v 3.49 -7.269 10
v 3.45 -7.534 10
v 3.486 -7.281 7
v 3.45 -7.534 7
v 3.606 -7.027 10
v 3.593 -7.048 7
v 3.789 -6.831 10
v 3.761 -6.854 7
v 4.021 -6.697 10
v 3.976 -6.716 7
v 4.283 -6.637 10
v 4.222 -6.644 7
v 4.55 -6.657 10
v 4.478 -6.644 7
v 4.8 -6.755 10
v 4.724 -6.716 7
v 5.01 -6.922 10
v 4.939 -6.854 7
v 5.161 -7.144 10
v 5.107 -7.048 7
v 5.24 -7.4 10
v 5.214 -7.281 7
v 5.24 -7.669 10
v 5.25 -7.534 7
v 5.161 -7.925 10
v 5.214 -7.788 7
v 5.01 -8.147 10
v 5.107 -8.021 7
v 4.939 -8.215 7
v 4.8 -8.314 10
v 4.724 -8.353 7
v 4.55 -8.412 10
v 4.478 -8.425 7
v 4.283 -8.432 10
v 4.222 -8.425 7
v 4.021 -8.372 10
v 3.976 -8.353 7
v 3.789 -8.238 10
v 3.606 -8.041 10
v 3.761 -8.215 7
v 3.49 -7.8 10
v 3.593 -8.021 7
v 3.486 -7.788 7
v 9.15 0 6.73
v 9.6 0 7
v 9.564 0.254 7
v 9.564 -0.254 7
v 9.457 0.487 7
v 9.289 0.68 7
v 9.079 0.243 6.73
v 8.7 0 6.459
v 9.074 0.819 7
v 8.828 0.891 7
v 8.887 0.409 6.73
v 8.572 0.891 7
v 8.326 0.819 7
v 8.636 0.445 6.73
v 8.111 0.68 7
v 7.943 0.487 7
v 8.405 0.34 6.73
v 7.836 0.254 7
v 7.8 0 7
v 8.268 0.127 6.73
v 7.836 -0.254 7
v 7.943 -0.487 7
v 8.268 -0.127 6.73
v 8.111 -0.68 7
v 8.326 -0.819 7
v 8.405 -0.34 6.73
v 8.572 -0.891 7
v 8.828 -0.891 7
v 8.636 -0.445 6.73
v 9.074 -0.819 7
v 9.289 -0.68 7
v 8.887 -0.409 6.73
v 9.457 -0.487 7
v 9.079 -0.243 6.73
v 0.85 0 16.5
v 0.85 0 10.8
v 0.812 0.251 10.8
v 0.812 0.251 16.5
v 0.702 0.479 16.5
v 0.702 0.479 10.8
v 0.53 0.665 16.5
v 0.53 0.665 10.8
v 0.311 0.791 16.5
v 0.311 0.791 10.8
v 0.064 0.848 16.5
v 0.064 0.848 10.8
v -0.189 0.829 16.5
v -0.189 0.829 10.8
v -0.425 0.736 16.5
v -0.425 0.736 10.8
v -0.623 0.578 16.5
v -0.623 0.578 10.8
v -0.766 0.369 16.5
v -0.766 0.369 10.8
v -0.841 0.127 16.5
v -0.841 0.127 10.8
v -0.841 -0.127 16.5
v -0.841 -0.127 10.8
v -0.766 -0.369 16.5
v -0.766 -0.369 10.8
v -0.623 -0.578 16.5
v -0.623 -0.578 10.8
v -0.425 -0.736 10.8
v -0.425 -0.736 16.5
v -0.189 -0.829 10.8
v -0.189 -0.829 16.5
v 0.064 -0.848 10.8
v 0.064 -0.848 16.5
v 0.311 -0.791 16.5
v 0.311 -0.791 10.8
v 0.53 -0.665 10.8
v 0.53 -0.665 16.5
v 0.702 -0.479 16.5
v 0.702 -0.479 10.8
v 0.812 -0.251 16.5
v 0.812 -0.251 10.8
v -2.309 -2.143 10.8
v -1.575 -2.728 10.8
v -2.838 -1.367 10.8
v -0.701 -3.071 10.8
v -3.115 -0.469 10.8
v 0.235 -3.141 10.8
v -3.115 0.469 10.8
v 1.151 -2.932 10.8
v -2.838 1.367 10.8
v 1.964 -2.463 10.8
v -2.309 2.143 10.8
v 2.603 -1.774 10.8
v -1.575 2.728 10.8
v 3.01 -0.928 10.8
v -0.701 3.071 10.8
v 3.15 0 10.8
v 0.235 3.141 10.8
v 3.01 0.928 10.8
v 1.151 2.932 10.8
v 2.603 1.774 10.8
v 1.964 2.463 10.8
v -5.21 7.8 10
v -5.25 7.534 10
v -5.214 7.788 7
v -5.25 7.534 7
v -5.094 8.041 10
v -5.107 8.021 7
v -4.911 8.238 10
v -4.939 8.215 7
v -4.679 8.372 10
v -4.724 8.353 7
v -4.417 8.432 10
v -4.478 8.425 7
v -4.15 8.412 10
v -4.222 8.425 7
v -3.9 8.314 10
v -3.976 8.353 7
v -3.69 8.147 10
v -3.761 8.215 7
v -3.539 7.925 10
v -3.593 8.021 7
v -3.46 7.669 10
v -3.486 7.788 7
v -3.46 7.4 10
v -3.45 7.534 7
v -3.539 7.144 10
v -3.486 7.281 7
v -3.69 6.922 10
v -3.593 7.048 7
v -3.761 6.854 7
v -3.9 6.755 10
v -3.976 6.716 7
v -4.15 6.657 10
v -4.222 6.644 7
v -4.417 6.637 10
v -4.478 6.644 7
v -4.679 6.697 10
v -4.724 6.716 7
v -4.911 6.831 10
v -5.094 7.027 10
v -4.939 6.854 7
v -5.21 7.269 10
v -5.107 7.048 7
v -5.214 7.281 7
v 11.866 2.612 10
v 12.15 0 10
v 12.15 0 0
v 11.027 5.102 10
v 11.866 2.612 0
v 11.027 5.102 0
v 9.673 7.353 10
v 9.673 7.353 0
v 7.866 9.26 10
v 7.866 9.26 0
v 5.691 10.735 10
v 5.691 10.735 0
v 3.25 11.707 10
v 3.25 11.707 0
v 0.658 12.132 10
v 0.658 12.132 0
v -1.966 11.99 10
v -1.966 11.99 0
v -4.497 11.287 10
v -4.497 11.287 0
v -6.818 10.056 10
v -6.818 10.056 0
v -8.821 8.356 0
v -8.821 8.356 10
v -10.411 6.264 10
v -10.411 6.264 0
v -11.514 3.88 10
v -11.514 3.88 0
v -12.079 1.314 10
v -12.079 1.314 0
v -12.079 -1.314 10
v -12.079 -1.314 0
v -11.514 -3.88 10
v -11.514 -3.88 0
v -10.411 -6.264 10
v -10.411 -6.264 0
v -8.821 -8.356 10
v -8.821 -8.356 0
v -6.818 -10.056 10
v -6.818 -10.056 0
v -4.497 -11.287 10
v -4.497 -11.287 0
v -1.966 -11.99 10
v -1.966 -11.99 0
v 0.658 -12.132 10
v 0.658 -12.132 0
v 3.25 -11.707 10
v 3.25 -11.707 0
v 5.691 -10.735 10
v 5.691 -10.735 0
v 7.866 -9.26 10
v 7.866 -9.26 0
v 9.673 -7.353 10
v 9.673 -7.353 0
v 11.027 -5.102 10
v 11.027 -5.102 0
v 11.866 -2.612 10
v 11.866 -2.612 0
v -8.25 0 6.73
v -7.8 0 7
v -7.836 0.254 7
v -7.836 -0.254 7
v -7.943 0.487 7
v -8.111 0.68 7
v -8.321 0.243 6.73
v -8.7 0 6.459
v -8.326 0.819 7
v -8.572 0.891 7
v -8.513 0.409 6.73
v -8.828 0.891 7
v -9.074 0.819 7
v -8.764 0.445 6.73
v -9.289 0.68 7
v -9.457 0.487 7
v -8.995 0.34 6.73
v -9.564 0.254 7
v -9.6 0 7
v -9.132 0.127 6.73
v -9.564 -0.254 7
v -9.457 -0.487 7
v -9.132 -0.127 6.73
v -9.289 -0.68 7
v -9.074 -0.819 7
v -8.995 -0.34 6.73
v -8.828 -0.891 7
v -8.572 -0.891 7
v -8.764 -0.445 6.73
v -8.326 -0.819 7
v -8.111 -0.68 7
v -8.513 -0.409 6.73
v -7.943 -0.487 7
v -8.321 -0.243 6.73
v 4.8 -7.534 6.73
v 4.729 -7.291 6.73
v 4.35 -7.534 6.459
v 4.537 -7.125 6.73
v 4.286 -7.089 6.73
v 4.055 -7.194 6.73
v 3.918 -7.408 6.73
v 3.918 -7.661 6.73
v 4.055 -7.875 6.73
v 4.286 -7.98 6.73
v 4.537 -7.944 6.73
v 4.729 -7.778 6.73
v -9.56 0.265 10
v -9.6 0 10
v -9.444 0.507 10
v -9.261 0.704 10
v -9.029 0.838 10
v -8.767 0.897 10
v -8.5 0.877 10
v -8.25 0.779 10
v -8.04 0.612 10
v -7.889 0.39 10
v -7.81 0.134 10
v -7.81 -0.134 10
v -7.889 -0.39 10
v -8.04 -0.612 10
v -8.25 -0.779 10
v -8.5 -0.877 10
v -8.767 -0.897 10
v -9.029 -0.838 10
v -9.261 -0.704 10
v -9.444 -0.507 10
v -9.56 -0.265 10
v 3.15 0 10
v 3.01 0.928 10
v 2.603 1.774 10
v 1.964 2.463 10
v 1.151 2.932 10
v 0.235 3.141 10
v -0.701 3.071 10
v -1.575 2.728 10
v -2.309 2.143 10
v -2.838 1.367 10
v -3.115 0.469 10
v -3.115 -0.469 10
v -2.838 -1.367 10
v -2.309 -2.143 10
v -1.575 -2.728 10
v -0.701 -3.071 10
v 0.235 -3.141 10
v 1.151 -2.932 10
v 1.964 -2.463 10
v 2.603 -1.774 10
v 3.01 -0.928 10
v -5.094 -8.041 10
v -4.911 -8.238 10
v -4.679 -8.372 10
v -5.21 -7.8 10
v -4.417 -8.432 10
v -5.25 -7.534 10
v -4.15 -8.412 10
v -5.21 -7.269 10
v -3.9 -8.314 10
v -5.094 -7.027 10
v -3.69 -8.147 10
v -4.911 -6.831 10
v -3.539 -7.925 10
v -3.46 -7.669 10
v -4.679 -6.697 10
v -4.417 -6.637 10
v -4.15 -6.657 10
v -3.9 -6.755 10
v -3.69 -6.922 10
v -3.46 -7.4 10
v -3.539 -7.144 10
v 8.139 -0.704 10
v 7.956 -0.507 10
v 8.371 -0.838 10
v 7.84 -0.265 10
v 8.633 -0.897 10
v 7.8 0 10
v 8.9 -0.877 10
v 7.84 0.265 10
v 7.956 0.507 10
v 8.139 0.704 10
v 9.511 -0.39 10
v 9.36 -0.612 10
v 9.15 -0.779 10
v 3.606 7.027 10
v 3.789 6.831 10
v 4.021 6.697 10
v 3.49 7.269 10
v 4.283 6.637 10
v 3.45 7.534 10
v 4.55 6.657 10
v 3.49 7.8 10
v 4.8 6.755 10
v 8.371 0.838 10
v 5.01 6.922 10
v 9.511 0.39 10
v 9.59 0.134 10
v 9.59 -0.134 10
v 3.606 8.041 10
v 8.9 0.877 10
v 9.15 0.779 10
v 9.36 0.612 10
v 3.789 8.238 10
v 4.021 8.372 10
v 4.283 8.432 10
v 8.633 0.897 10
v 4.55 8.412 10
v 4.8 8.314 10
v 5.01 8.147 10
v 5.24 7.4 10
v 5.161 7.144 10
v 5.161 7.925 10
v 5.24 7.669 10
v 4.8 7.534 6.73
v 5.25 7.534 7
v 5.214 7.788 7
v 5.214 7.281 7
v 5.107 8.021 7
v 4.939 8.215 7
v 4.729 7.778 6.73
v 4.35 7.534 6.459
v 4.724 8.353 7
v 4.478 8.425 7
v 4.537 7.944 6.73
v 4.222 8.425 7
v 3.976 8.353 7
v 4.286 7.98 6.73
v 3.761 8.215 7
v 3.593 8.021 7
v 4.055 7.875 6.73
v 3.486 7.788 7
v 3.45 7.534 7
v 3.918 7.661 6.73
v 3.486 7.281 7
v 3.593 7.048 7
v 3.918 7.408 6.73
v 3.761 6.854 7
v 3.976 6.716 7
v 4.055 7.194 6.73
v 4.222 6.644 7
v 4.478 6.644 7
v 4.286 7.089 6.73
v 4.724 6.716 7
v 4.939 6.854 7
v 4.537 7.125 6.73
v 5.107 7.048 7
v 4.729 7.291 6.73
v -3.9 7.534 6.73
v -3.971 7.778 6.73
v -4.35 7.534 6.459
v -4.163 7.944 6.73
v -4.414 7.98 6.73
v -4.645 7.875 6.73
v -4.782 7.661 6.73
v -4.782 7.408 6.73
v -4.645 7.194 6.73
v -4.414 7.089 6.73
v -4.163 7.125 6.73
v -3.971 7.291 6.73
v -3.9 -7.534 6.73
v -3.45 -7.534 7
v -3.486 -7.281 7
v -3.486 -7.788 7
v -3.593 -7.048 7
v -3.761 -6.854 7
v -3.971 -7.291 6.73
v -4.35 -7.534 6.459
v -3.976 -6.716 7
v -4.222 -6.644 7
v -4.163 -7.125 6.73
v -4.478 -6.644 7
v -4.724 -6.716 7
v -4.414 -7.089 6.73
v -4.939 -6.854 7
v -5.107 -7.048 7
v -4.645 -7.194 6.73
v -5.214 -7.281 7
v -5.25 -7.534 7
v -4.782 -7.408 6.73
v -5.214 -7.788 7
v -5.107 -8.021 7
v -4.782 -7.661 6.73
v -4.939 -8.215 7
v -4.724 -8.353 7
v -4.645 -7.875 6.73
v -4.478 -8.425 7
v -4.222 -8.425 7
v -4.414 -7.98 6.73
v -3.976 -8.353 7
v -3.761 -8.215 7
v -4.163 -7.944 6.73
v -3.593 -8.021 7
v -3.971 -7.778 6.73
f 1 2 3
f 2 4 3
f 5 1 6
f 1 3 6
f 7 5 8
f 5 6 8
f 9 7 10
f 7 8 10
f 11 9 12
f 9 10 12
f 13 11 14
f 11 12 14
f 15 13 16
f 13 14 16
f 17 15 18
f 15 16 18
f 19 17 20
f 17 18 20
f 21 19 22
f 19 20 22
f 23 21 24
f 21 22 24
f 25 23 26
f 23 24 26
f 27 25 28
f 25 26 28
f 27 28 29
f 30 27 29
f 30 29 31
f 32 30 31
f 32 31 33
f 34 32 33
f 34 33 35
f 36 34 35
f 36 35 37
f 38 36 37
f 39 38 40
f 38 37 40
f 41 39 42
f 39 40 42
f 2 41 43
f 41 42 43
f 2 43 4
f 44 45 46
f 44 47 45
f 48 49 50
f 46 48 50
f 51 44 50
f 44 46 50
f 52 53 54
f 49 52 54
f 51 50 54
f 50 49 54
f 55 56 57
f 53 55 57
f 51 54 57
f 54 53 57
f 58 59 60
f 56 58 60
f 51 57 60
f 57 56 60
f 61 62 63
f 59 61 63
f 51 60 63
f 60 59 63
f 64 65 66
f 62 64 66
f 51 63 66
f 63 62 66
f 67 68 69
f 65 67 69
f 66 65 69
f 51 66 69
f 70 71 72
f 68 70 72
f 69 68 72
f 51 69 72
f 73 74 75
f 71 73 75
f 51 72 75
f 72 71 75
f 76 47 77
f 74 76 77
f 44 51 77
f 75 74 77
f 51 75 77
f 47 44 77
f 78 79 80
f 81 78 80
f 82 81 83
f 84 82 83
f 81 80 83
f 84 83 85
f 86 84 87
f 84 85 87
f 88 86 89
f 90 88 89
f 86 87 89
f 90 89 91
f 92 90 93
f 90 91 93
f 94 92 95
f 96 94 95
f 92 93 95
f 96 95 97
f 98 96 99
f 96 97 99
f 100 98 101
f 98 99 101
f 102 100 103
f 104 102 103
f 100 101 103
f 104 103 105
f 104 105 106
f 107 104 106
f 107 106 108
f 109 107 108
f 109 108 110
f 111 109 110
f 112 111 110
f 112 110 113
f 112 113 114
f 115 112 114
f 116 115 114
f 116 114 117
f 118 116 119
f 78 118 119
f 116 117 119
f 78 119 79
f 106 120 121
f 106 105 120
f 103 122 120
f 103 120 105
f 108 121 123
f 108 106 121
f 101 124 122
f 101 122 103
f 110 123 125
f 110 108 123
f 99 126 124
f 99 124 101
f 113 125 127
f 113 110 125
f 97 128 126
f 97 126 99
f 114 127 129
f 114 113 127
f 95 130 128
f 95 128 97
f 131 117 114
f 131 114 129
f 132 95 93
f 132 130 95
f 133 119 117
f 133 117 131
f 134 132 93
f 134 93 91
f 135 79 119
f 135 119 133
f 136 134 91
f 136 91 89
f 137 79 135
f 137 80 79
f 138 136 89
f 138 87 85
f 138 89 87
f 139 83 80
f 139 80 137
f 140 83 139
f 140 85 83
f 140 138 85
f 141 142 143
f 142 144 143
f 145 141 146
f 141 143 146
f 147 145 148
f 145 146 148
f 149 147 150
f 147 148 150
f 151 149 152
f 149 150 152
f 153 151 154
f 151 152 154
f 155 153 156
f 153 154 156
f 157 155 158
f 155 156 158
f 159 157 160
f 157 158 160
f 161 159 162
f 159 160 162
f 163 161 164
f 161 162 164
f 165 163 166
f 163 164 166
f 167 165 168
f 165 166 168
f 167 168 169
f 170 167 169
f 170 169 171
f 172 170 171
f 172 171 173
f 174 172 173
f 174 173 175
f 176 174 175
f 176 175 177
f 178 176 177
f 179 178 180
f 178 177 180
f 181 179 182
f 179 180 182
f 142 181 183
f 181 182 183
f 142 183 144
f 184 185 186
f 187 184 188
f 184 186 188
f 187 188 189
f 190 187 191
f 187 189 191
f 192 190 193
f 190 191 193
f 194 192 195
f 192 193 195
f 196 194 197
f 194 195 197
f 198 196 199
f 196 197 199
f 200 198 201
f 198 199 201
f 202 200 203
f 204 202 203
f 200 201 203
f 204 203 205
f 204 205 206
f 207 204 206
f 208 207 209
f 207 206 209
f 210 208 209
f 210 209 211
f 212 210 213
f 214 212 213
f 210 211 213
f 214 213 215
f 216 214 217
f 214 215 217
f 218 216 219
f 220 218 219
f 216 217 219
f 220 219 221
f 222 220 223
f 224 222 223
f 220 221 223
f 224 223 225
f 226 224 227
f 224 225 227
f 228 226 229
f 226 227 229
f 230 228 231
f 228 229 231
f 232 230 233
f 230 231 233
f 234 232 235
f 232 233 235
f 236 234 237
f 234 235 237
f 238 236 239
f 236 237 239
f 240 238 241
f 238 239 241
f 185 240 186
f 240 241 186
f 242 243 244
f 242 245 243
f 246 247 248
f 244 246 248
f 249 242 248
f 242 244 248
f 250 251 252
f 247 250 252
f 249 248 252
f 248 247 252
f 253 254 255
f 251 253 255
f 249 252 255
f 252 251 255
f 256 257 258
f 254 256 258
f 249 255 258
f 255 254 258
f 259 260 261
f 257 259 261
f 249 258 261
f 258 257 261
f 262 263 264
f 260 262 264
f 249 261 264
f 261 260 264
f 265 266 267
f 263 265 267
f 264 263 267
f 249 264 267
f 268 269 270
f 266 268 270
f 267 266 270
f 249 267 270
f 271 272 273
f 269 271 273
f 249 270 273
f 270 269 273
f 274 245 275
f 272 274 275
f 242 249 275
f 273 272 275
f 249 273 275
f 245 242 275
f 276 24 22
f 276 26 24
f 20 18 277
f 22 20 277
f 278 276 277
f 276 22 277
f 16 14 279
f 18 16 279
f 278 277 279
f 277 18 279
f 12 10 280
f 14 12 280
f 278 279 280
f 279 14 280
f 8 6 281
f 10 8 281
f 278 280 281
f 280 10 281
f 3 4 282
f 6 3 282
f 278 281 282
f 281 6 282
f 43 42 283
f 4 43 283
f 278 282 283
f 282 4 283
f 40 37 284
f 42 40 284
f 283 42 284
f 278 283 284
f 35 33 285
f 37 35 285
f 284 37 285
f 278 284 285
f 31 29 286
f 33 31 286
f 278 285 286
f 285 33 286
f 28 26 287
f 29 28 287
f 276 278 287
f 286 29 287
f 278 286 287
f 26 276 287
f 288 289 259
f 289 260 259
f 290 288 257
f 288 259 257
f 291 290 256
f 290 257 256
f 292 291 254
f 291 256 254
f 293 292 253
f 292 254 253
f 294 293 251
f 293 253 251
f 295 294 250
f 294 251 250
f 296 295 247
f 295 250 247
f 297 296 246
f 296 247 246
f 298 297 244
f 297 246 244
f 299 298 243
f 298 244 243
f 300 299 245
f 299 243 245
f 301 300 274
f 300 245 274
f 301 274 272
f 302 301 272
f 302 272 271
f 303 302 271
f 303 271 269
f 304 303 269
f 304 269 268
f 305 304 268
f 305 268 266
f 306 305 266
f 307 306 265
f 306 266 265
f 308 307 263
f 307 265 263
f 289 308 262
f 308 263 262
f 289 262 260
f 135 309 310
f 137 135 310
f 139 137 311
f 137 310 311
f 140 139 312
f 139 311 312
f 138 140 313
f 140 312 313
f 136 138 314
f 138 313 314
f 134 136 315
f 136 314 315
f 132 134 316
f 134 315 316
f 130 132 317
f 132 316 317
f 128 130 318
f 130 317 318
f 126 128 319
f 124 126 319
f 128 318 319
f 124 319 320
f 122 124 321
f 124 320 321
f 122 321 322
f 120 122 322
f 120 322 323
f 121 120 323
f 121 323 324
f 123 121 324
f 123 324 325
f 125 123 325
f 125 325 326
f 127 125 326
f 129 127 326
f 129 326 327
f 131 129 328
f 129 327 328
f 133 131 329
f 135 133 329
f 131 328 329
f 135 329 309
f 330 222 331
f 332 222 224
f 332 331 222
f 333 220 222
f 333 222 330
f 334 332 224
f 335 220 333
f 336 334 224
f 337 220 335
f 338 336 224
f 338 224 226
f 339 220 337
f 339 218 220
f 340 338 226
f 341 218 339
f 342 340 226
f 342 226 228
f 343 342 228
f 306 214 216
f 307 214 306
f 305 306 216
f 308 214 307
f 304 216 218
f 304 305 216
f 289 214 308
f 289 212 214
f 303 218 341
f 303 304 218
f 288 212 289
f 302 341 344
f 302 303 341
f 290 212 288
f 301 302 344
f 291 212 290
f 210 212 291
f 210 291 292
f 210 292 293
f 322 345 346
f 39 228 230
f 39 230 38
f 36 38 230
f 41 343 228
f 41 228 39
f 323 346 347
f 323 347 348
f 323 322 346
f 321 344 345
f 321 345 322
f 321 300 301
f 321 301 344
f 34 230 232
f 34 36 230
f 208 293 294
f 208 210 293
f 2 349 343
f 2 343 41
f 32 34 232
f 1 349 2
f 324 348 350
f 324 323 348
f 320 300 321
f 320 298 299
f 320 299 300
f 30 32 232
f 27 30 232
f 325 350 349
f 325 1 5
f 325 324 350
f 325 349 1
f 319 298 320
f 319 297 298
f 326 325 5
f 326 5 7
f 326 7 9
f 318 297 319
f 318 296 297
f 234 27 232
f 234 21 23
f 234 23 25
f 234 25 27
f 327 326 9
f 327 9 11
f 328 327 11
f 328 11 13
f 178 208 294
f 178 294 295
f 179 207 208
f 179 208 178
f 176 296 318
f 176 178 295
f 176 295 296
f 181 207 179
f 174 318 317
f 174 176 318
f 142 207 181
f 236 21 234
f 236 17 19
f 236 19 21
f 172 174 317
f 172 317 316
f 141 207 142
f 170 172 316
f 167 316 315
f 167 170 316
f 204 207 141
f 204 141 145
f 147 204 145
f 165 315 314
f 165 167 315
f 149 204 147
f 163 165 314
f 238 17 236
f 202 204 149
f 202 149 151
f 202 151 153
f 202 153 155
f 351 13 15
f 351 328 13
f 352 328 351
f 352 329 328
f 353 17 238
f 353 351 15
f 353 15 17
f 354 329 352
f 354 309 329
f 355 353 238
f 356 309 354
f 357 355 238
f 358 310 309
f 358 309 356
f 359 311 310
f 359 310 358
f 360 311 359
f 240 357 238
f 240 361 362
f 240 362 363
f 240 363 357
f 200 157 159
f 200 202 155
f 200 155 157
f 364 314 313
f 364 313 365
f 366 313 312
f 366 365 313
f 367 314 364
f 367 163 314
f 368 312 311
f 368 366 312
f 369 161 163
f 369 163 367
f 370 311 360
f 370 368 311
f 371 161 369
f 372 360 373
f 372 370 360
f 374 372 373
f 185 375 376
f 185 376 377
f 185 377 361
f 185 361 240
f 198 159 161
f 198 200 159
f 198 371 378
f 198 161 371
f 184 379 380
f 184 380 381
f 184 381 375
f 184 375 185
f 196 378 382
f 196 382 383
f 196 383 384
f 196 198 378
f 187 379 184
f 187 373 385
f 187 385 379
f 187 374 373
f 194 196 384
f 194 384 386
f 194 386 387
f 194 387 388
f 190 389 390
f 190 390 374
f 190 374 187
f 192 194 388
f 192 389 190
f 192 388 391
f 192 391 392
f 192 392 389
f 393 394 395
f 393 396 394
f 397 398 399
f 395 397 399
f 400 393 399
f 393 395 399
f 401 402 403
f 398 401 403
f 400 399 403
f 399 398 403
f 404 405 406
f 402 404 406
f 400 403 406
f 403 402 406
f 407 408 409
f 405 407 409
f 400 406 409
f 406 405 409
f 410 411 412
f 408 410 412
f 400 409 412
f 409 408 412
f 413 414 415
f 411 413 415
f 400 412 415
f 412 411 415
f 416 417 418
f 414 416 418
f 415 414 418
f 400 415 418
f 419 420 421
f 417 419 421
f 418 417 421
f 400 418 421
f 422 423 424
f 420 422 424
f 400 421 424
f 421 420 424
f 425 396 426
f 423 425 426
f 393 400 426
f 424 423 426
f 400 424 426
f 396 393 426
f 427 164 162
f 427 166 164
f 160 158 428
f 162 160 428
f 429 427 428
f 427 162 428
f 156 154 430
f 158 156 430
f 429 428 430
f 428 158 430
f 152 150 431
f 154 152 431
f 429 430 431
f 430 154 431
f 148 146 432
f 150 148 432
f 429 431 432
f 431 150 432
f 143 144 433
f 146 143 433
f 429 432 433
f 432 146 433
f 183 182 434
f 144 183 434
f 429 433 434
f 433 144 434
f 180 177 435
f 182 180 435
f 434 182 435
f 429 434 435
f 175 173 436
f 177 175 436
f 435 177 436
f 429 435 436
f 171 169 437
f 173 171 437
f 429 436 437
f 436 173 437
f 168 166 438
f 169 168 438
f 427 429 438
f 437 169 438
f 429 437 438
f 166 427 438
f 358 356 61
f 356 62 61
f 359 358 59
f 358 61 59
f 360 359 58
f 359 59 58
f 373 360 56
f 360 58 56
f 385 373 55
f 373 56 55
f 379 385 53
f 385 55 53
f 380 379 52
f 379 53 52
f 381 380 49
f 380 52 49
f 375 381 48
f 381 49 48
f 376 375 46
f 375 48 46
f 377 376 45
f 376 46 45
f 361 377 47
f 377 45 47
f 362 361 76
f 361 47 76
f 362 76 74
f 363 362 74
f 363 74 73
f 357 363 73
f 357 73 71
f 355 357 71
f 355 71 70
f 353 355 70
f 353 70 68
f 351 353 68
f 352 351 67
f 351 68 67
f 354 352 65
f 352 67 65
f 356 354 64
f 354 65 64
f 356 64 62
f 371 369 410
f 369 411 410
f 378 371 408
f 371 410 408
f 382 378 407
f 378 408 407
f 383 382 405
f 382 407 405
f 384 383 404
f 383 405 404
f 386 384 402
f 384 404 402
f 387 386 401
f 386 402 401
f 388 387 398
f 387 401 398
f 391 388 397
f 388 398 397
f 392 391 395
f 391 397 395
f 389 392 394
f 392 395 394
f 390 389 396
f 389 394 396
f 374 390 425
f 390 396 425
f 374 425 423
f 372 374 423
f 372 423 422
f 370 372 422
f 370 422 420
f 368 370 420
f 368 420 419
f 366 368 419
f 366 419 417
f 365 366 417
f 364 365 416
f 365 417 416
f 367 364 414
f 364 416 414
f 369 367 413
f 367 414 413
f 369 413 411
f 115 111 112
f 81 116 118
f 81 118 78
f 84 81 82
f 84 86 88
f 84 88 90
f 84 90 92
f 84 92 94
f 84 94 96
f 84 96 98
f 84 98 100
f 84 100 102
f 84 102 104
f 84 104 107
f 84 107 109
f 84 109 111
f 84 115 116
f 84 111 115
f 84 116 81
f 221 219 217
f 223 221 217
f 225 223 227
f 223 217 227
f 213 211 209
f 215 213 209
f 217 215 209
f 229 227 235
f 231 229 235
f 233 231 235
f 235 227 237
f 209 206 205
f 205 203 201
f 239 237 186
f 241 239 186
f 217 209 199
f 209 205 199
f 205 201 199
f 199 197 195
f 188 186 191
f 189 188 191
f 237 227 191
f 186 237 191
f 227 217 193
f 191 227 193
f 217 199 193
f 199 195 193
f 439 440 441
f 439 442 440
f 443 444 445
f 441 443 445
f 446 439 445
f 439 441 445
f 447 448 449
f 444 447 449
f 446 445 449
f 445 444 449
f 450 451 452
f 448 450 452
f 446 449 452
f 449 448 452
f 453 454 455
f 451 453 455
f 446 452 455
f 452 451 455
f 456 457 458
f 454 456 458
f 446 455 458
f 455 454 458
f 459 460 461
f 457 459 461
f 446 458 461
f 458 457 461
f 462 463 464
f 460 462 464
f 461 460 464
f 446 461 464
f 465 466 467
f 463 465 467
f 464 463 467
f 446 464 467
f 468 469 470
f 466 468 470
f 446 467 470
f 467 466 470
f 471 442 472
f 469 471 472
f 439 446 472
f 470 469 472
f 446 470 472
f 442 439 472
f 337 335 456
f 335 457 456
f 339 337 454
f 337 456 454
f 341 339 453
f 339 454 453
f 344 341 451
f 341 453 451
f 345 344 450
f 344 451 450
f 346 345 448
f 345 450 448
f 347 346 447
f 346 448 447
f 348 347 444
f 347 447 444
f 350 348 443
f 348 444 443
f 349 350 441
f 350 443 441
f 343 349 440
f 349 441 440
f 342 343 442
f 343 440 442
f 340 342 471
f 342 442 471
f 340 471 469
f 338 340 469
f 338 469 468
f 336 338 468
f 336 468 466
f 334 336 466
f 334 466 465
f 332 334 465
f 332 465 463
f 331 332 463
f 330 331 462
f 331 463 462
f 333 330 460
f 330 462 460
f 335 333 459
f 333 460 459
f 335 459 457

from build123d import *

# Parameters (mm, degrees)
SKETCH1_R                  = 12.15
BOSS_EXTRUDE1_DEPTH        = 10
SKETCH2_R                  = 3.15
BOSS_EXTRUDE2_DEPTH        = 0.8
SKETCH3_R                  = 0.85
BOSS_EXTRUDE3_DEPTH        = 5.7
M1_6_CLEARANCE_HOLE1_D     = 1.8
M1_6_CLEARANCE_HOLE1_DEPTH = 3
M1_6_CLEARANCE_HOLE1_TIP   = 0.540774557


with BuildPart() as part:
    # Sketch1 → Boss-Extrude1 (new body)
    with BuildSketch(Plane.XY):
        Circle(SKETCH1_R)
    extrude(amount=BOSS_EXTRUDE1_DEPTH)

    # Sketch2 → Boss-Extrude2 (add)
    with BuildSketch(Plane.XY.offset(10)):
        Circle(SKETCH2_R)
    extrude(amount=BOSS_EXTRUDE2_DEPTH)

    # Sketch3 → Boss-Extrude3 (add)
    with BuildSketch(Plane.XY.offset(10.8)):
        Circle(SKETCH3_R)
    extrude(amount=BOSS_EXTRUDE3_DEPTH)

    # M1.6 Clearance Hole1
    with Locations(Plane.XY.offset(10)):
        with Locations((-4.35, 7.534421013), (4.35, 7.534421013), (8.7, 0), (4.35, -7.534421013), (-4.35, -7.534421013), (-8.7, 0)):
            Hole(M1_6_CLEARANCE_HOLE1_D / 2, depth=M1_6_CLEARANCE_HOLE1_DEPTH)
            with Locations((0, 0, -(M1_6_CLEARANCE_HOLE1_DEPTH + M1_6_CLEARANCE_HOLE1_TIP / 2))):  # 118° drill point
                Cone(0, M1_6_CLEARANCE_HOLE1_D / 2, M1_6_CLEARANCE_HOLE1_TIP, mode=Mode.SUBTRACT)


solid = part.part
